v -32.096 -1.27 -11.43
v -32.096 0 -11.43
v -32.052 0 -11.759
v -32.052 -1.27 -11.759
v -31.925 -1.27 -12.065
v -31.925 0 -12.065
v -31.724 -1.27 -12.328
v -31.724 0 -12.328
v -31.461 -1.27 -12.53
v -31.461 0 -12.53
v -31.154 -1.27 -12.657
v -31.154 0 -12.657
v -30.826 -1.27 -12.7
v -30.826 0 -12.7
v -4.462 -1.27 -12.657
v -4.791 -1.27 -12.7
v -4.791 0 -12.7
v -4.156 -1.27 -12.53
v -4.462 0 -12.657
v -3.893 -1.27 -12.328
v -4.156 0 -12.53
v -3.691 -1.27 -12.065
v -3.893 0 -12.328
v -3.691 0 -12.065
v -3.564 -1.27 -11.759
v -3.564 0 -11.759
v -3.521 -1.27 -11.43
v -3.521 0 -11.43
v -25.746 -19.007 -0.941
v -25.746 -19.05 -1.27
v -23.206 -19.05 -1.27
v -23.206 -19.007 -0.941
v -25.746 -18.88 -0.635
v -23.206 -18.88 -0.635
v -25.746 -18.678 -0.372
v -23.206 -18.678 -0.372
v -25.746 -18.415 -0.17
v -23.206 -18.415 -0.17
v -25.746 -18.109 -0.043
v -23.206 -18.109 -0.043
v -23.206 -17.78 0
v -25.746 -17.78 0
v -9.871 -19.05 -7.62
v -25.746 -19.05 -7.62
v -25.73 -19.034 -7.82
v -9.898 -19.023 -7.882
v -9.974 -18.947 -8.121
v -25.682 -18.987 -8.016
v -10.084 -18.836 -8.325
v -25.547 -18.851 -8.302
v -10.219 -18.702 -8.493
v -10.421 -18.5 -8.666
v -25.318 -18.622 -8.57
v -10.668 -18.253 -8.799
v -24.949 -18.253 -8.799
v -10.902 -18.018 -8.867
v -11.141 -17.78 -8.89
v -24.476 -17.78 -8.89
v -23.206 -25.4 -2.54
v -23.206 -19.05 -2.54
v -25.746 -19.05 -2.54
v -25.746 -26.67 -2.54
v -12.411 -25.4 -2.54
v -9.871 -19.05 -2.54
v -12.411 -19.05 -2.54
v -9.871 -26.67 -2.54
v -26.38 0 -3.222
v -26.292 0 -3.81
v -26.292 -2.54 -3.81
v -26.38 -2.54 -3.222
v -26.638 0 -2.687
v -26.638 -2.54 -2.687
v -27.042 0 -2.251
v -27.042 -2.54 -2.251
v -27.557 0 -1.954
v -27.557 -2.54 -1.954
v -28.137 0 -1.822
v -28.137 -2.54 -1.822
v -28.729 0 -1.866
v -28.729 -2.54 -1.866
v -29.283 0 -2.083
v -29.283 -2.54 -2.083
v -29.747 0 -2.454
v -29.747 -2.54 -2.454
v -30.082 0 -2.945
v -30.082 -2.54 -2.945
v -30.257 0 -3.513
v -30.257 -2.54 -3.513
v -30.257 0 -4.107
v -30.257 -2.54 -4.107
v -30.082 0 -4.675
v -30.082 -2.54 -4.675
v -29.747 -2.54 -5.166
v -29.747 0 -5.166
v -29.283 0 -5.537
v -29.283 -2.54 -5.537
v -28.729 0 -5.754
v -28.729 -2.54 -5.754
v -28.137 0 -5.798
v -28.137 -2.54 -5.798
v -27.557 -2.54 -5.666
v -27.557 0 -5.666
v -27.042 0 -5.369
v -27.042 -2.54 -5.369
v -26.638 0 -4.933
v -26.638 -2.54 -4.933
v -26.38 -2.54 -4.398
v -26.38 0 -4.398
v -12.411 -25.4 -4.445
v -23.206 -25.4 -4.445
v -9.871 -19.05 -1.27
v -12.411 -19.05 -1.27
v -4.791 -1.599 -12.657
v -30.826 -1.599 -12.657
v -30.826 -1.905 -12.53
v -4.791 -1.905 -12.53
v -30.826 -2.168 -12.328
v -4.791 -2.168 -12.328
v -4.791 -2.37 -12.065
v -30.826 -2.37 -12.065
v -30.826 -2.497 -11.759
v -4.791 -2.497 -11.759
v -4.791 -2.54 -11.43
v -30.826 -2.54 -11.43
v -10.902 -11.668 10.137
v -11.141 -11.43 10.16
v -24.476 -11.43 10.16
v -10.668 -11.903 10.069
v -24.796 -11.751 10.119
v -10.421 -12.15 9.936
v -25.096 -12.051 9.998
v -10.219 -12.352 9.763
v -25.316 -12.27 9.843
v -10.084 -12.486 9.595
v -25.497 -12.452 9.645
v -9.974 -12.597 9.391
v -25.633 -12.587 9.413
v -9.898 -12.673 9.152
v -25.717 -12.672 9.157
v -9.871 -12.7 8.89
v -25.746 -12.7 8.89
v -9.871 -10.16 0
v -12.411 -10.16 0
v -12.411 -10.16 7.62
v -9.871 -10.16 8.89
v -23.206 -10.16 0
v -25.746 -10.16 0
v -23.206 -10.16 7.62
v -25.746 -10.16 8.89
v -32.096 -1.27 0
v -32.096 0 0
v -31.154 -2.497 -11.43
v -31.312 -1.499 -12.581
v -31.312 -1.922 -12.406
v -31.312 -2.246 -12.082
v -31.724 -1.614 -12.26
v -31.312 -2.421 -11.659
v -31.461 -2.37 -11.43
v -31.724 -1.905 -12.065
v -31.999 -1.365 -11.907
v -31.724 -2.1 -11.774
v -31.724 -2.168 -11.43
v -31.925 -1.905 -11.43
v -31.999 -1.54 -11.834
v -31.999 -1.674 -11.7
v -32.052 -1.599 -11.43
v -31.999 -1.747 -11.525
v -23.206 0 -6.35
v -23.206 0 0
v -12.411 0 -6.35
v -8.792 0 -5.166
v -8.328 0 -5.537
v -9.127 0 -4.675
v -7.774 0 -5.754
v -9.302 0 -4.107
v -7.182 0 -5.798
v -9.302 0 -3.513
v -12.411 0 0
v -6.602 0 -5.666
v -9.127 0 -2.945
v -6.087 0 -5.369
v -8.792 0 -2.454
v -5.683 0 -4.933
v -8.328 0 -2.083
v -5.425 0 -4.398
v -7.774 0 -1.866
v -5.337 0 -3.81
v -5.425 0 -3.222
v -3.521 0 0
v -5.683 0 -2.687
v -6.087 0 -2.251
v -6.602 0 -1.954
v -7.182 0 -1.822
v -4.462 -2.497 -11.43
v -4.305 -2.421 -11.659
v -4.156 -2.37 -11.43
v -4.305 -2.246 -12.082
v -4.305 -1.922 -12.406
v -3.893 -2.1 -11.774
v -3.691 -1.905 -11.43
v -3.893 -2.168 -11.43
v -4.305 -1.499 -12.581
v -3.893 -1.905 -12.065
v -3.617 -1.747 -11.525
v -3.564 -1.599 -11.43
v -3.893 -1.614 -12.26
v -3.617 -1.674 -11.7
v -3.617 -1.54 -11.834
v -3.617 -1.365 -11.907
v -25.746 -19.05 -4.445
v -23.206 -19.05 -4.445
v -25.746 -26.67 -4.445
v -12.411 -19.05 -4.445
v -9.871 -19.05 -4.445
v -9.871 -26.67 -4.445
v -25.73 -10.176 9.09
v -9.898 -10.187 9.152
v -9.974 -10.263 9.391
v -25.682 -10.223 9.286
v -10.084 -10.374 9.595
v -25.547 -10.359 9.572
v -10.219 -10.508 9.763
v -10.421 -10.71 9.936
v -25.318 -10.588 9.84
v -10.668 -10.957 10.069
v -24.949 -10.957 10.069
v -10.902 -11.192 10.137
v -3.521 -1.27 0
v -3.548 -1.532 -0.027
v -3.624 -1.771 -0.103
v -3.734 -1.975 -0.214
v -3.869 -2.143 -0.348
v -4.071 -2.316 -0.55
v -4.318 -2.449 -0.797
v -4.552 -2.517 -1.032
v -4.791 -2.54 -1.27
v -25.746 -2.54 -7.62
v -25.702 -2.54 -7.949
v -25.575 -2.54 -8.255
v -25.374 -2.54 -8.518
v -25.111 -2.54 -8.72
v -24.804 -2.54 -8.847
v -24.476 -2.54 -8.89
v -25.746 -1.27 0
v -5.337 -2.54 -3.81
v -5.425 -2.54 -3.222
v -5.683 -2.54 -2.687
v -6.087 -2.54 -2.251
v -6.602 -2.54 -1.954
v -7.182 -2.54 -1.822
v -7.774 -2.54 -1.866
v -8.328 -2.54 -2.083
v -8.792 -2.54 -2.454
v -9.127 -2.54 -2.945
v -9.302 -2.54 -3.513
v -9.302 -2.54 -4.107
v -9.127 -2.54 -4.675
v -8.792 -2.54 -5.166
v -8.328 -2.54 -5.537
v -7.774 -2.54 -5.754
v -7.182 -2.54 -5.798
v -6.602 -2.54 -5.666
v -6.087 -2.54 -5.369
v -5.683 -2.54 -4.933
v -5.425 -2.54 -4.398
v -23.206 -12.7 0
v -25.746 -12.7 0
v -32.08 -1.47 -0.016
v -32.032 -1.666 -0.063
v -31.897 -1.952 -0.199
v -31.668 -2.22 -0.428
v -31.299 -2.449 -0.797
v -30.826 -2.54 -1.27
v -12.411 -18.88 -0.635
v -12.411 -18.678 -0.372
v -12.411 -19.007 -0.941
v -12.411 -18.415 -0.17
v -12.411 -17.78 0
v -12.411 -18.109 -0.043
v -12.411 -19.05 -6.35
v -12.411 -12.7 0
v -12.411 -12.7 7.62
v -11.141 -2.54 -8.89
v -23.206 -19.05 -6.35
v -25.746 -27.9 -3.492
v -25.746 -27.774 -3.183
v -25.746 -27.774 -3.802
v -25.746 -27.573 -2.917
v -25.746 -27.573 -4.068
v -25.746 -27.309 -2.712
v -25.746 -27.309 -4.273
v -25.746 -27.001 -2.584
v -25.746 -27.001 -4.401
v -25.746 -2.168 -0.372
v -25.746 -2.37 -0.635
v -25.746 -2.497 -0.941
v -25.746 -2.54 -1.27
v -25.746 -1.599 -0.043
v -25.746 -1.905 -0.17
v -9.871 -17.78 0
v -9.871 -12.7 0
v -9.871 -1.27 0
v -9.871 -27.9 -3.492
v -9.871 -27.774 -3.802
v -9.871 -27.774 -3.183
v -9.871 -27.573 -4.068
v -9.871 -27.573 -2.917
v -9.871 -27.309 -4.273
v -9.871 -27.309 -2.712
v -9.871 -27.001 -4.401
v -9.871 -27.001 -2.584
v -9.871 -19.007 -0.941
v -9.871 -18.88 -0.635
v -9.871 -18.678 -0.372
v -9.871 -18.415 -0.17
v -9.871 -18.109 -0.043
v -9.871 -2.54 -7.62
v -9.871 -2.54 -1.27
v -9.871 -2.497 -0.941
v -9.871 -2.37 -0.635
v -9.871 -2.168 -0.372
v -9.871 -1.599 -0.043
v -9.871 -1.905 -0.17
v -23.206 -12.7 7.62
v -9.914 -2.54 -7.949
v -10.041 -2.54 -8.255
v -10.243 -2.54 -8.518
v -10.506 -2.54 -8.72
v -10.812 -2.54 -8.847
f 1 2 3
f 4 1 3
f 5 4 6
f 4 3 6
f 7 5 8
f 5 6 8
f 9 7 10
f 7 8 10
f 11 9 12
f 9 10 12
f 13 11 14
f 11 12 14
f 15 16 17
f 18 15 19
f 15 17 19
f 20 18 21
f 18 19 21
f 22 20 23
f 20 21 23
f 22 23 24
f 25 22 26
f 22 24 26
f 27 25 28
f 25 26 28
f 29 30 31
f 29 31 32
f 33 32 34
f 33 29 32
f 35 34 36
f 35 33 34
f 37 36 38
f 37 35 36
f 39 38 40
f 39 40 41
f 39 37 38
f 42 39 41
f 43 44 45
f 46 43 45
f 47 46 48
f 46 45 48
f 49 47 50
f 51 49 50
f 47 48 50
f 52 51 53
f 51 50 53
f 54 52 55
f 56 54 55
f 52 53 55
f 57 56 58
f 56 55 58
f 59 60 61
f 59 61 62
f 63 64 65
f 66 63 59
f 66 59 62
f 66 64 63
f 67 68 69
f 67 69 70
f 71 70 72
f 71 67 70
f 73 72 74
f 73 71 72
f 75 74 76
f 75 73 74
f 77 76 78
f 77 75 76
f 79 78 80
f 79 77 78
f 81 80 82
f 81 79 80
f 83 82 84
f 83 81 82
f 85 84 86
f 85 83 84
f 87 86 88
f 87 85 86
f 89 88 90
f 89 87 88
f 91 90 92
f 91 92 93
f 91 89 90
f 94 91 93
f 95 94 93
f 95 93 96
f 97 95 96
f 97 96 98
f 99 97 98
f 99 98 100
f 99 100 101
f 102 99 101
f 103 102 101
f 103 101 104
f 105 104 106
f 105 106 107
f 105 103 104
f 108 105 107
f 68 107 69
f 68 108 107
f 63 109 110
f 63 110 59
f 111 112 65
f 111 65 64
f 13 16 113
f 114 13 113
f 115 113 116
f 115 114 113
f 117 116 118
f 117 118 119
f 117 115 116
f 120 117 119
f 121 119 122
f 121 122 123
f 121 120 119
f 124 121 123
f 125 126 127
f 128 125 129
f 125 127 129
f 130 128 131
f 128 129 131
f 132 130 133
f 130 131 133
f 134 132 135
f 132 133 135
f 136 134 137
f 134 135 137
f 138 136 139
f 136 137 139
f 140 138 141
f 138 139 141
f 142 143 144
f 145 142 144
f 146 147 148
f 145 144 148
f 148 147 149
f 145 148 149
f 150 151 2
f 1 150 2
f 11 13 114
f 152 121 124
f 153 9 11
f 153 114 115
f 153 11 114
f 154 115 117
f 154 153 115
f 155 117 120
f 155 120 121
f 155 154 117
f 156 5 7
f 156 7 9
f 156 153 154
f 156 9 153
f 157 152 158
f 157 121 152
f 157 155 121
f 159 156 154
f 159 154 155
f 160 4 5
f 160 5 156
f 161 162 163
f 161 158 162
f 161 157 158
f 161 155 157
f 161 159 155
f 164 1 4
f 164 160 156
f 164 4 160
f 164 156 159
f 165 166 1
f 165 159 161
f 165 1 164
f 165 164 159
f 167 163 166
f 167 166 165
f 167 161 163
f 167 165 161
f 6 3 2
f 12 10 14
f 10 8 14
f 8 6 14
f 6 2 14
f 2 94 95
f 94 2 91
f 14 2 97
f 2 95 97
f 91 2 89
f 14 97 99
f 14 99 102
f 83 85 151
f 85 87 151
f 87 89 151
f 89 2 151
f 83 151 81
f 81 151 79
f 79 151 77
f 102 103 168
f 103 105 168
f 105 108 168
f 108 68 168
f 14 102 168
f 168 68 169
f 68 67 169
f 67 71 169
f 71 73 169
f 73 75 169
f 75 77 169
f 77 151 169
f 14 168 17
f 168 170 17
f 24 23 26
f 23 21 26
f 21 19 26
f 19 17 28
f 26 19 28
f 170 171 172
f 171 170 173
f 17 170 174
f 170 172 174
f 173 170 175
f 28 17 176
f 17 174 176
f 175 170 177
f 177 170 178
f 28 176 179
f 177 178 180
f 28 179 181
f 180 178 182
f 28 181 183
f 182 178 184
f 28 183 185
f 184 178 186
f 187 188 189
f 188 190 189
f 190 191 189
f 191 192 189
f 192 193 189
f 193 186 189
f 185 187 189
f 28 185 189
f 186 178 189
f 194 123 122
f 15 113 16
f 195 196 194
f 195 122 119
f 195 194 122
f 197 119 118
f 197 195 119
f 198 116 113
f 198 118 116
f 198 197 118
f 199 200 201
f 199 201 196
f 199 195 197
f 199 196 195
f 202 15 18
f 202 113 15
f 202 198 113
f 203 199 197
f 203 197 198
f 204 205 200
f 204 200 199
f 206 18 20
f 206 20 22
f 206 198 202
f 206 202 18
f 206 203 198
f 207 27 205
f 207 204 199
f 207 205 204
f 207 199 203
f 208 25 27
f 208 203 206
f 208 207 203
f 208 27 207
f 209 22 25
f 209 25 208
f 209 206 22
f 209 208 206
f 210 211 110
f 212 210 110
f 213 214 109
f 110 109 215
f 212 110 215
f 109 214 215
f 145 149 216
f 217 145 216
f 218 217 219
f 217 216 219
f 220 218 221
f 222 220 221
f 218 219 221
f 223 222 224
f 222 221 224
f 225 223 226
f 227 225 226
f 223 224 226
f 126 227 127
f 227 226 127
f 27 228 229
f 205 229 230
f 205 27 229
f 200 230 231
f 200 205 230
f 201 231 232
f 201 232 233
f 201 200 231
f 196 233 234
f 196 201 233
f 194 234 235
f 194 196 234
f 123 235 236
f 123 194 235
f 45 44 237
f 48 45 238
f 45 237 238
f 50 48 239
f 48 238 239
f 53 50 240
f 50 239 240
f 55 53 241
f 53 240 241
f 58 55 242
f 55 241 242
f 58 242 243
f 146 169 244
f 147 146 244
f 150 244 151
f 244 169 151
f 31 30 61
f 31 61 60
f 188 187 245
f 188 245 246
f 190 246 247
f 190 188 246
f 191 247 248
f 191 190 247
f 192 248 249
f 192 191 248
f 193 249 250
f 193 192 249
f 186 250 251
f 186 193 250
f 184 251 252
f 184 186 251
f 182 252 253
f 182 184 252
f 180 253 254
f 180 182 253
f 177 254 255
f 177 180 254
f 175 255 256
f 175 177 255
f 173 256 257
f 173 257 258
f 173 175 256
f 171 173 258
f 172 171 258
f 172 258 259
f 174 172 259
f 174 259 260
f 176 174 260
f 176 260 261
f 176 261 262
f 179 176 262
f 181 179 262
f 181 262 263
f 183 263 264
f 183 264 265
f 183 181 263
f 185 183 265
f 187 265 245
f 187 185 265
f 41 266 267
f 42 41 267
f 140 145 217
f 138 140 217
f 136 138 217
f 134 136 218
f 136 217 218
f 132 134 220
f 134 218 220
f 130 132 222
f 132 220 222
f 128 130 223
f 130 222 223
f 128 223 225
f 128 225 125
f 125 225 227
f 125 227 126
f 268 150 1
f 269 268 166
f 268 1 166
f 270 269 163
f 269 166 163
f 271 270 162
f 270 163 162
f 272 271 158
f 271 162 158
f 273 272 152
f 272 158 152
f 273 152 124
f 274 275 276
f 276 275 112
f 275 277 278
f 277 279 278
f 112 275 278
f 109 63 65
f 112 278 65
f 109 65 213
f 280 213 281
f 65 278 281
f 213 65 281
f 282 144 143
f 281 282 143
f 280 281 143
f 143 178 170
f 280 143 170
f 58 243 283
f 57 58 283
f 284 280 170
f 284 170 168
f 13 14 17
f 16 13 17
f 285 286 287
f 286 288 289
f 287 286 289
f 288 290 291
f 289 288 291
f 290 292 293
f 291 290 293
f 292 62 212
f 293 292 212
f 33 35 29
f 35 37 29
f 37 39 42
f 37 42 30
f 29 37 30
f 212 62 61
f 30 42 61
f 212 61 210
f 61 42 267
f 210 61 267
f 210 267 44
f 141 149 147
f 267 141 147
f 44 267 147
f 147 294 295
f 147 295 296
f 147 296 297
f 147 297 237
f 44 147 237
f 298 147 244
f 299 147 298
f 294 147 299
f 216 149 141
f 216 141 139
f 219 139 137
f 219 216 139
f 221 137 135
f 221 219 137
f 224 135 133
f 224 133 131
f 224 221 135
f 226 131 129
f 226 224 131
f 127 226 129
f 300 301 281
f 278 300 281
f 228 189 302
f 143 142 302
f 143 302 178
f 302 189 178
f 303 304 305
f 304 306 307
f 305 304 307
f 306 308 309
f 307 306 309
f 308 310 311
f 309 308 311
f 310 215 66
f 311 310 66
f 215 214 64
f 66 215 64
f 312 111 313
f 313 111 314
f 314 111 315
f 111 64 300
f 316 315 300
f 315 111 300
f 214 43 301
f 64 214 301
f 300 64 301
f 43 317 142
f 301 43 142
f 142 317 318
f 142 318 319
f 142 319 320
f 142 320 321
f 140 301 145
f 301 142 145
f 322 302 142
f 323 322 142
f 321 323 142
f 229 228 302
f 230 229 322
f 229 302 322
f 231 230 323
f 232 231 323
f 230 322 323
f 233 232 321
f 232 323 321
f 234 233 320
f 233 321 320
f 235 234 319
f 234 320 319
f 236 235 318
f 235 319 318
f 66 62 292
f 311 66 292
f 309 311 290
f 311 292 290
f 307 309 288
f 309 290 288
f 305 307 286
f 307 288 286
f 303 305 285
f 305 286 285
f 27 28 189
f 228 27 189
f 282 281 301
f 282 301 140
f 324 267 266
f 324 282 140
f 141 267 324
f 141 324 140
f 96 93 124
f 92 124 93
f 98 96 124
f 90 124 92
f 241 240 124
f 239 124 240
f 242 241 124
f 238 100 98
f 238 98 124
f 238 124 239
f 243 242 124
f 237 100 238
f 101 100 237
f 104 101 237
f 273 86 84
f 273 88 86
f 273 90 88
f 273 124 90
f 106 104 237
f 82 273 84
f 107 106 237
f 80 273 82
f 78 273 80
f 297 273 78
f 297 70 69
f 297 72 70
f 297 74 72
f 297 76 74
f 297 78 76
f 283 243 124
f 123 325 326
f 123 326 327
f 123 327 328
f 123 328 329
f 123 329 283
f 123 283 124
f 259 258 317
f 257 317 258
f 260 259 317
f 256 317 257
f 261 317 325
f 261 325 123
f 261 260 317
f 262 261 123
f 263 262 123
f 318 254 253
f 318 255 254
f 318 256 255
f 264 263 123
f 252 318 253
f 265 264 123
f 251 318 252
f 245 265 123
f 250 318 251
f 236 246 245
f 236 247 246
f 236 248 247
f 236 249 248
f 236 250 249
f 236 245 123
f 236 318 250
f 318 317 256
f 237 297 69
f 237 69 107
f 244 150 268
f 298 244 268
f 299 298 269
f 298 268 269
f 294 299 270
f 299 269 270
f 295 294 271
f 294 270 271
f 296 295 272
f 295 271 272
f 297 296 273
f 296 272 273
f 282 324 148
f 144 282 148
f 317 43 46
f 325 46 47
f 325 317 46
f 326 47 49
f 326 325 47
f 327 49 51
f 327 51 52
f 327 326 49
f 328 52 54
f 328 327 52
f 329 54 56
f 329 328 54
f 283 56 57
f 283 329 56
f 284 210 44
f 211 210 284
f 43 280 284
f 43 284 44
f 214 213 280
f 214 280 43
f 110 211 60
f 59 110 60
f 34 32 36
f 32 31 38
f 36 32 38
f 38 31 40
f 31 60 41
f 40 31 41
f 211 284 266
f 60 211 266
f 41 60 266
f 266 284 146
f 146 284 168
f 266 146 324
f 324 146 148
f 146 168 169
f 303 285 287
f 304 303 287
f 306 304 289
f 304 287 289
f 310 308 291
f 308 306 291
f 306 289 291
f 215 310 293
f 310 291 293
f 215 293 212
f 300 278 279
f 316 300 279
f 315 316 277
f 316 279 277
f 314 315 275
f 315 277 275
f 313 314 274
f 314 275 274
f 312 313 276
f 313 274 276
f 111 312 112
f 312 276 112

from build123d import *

# Parameters (mm, degrees)
F1_DEPTH      = 19.05
F0_R          = 1.9939
F2_DEPTH      = 2.54
F3_W          = 2.54
F3_H          = 1.905
F4_DEPTH      = 8.89
F5_W          = 2.54
F5_H          = 1.905
F6_DEPTH      = 11.43
F7_W          = 2.54
F7_H          = 2.54
F8_W          = 2.54
F8_H          = 2.54
F9_DEPTH      = 10.16
F10_W         = 2.54
F10_H         = 2.54
F11_DEPTH     = 11.43
F12_T1_DEPTH  = 9.525
F12_T3_DEPTH  = 14.605
F12_T5_DEPTH  = 26.035
F12_T7_DEPTH  = 9.525
F12_T9_DEPTH  = 4.445
F12_T11_DEPTH = 19.685
F12_T13_DEPTH = 22.225
F12_T15_DEPTH = 8.89
F12_T17_DEPTH = 8.89
F12_T19_DEPTH = 8.89
F12_S23_W     = 1.27
F12_S23_H     = 1.27
F12_T24_DEPTH = 1.27
F12_S29_W     = 1.27
F12_S29_H     = 1.27
F12_T30_DEPTH = 1.27


# Not quite as in the source:
# - a fillet or chamfer that OpenCascade refuses, or shapes differently, is made with other operations: its cross-section is extruded or revolved along the edge and cut away or added


with BuildPart() as f1:
    # F0 (on Front) → F1 (new body)
    with BuildSketch(Plane.XZ):
        Polygon((-23.2056408978, -6.35), (-23.2056408978, 0), (-25.7456408978, 0), (-25.7456408978, -8.89), (-9.8706408978, -8.89), (-9.8706408978, 0), (-12.4106408978, 0), (-12.4106408978, -6.35), align=None)
    extrude(amount=F1_DEPTH)

    # F0 (on Front) → F2 (join)
    with BuildSketch(Plane.XZ):
        Polygon((-25.7456408978, -8.89), (-25.7456408978, 0), (-32.0956408978, 0), (-32.0956408978, -12.7), (-3.5206408978, -12.7), (-3.5206408978, 0), (-9.8706408978, 0), (-9.8706408978, -8.89), align=None)
        with Locations((-28.2856408978, -3.81)):
            Circle(F0_R, mode=Mode.SUBTRACT)
        with Locations((-7.3306408978, -3.81)):
            Circle(F0_R, mode=Mode.SUBTRACT)
    extrude(amount=F2_DEPTH)

    # F3 (on face) → F4 (join)
    with BuildSketch(Plane.XZ.offset(19.05)):
        with Locations((-11.1406408978, -3.4925)):
            Rectangle(F3_W, F3_H)
        with Locations((-24.4756408978, -3.4925)):
            Rectangle(F3_W, F3_H)
    extrude(amount=F4_DEPTH)

    # F5 (on face) → F6 (join)
    with BuildSketch(Plane(origin=(-12.4106408978, 0, 0), x_dir=(0, -1, 0), z_dir=(-1, 0, 0))):
        with Locations((26.67, -3.4925)):
            Rectangle(F5_W, F5_H)
    extrude(amount=F6_DEPTH)

    # F7 (on face) + F8 (on face) → F9 (join)
    with BuildSketch(Plane.XY):
        with Locations((-24.4756408978, -11.43)):
            Rectangle(F7_W, F7_H)
    with BuildSketch(Plane.XY):
        with Locations((-11.1406408978, -11.43)):
            Rectangle(F8_W, F8_H)
    extrude(amount=F9_DEPTH)

    # F10 (on face) → F11 (join)
    with BuildSketch(Plane.YZ.offset(-23.2056408978)):
        with Locations((-11.43, 8.89)):
            Rectangle(F10_W, F10_H)
    extrude(amount=F11_DEPTH)

    # F12: fillet of radius 1.27 on 18 edges, made by hand

    # F12_s2 → F12_t1 (cut)
    with BuildSketch(Plane.YZ.offset(-35.2706408978)):
        with BuildLine():
            ThreePointArc((-1.27, 0), (-2.1680256121, -0.3719743879), (-2.54, -1.27))
            Line((-2.54, -1.27), (-2.54, 0))
            Line((-2.54, 0), (-1.27, 0))
        make_face()
    extrude(amount=F12_T1_DEPTH, mode=Mode.SUBTRACT)

    # F12_s4 → F12_t3 (cut)
    with BuildSketch(Plane.XY.offset(-11.43)):
        with BuildLine():
            ThreePointArc((-32.0956408978, -1.27), (-31.7236665099, -2.1680256121), (-30.8256408978, -2.54))
            Line((-30.8256408978, -2.54), (-32.0956408978, -2.54))
            Line((-32.0956408978, -2.54), (-32.0956408978, -1.27))
        make_face()
        with BuildLine():
            ThreePointArc((-3.5206408978, -1.27), (-3.8926152856, -2.1680256121), (-4.7906408978, -2.54))
            Line((-4.7906408978, -2.54), (-3.5206408978, -2.54))
            Line((-3.5206408978, -2.54), (-3.5206408978, -1.27))
        make_face()
    extrude(amount=F12_T3_DEPTH, mode=Mode.SUBTRACT)

    # F12_s6 → F12_t5 (cut)
    with BuildSketch(Plane.YZ.offset(-30.8256408978)):
        with BuildLine():
            ThreePointArc((-1.27, -12.7), (-2.1680256121, -12.3280256121), (-2.54, -11.43))
            Line((-2.54, -11.43), (-2.54, -12.7))
            Line((-2.54, -12.7), (-1.27, -12.7))
        make_face()
    extrude(amount=F12_T5_DEPTH, mode=Mode.SUBTRACT)

    # F12_s8 → F12_t7 (cut)
    with BuildSketch(Plane.YZ.offset(-9.8706408978)):
        with BuildLine():
            ThreePointArc((-1.27, 0), (-2.1680256121, -0.3719743879), (-2.54, -1.27))
            Line((-2.54, -1.27), (-2.54, 0))
            Line((-2.54, 0), (-1.27, 0))
        make_face()
    extrude(amount=F12_T7_DEPTH, mode=Mode.SUBTRACT)

    # F12_s10 → F12_t9 (cut)
    with BuildSketch(Plane.XZ.offset(-3.175)):
        with BuildLine():
            ThreePointArc((-4.7906408978, -12.7), (-3.8926152856, -12.3280256121), (-3.5206408978, -11.43))
            Line((-3.5206408978, -11.43), (-3.5206408978, -12.7))
            Line((-3.5206408978, -12.7), (-4.7906408978, -12.7))
        make_face()
        with BuildLine():
            ThreePointArc((-32.0956408978, -11.43), (-31.7236665099, -12.3280256121), (-30.8256408978, -12.7))
            Line((-30.8256408978, -12.7), (-32.0956408978, -12.7))
            Line((-32.0956408978, -12.7), (-32.0956408978, -11.43))
        make_face()
    extrude(amount=F12_T9_DEPTH, mode=Mode.SUBTRACT)

    # F12_s12 → F12_t11 (cut)
    with BuildSketch(Plane.XZ.offset(2.54)):
        with BuildLine():
            ThreePointArc((-9.8706408978, -7.62), (-10.2426152856, -8.5180256121), (-11.1406408978, -8.89))
            Line((-11.1406408978, -8.89), (-9.8706408978, -8.89))
            Line((-9.8706408978, -8.89), (-9.8706408978, -7.62))
        make_face()
        with BuildLine():
            ThreePointArc((-25.7456408978, -7.62), (-25.3736665099, -8.5180256121), (-24.4756408978, -8.89))
            Line((-24.4756408978, -8.89), (-25.7456408978, -8.89))
            Line((-25.7456408978, -8.89), (-25.7456408978, -7.62))
        make_face()
    extrude(amount=F12_T11_DEPTH, mode=Mode.SUBTRACT)

    # F12_s14 → F12_t13 (cut)
    with BuildSketch(Plane.YZ.offset(-28.9206408978)):
        with BuildLine():
            ThreePointArc((-26.67, -2.54), (-27.5680256121, -2.9119743879), (-27.94, -3.81))
            Line((-27.94, -3.81), (-27.94, -2.54))
            Line((-27.94, -2.54), (-26.67, -2.54))
        make_face()
        with BuildLine():
            ThreePointArc((-19.05, -7.62), (-18.6780256121, -8.5180256121), (-17.78, -8.89))
            Line((-17.78, -8.89), (-19.05, -8.89))
            Line((-19.05, -8.89), (-19.05, -7.62))
        make_face()
        with BuildLine():
            ThreePointArc((-27.94, -3.175), (-27.5680256121, -4.0730256121), (-26.67, -4.445))
            Line((-26.67, -4.445), (-27.94, -4.445))
            Line((-27.94, -4.445), (-27.94, -3.175))
        make_face()
        with BuildLine():
            ThreePointArc((-11.43, 10.16), (-12.3280256121, 9.7880256121), (-12.7, 8.89))
            Line((-12.7, 8.89), (-12.7, 10.16))
            Line((-12.7, 10.16), (-11.43, 10.16))
        make_face()
        with BuildLine():
            ThreePointArc((-10.16, 8.89), (-10.5319743879, 9.7880256121), (-11.43, 10.16))
            Line((-11.43, 10.16), (-10.16, 10.16))
            Line((-10.16, 10.16), (-10.16, 8.89))
        make_face()
    extrude(amount=F12_T13_DEPTH, mode=Mode.SUBTRACT)

    # F12_s16 → F12_t15 (cut)
    with BuildSketch(Plane.YZ.offset(-28.9206408978)):
        with BuildLine():
            ThreePointArc((-19.05, -1.27), (-18.6780256121, -0.3719743879), (-17.78, 0))
            Line((-17.78, 0), (-19.05, 0))
            Line((-19.05, 0), (-19.05, -1.27))
        make_face()
    extrude(amount=F12_T15_DEPTH, mode=Mode.SUBTRACT)

    # F12_s18 → F12_t17 (cut)
    with BuildSketch(Plane.YZ.offset(-15.5856408978)):
        with BuildLine():
            ThreePointArc((-17.78, 0), (-18.6780256121, -0.3719743879), (-19.05, -1.27))
            Line((-19.05, -1.27), (-19.05, 0))
            Line((-19.05, 0), (-17.78, 0))
        make_face()
    extrude(amount=F12_T17_DEPTH, mode=Mode.SUBTRACT)

    # F12_s20 → F12_t19 (cut)
    with BuildSketch(Plane.XZ.offset(6.985)):
        with BuildLine():
            ThreePointArc((-25.7456408978, 8.89), (-25.3736665099, 9.7880256121), (-24.4756408978, 10.16))
            Line((-24.4756408978, 10.16), (-25.7456408978, 10.16))
            Line((-25.7456408978, 10.16), (-25.7456408978, 8.89))
        make_face()
        with BuildLine():
            ThreePointArc((-9.8706408978, 8.89), (-10.2426152856, 9.7880256121), (-11.1406408978, 10.16))
            Line((-11.1406408978, 10.16), (-9.8706408978, 10.16))
            Line((-9.8706408978, 10.16), (-9.8706408978, 8.89))
        make_face()
    extrude(amount=F12_T19_DEPTH, mode=Mode.SUBTRACT)


with BuildPart() as f12_tool22:
    # F12_s23 → F12_t24 (new body)
    with BuildSketch(Plane.YZ.offset(-30.8256408978)):
        with Locations((-1.905, -12.065)):
            Rectangle(F12_S23_W, F12_S23_H)
    extrude(amount=-F12_T24_DEPTH)

    # F12_s25 → F12_t26 (revolve, cut)
    with BuildSketch(Plane(origin=(-30.8256408978, -1.27, -11.43), x_dir=(0, 0.7071067812, 0.7071067812), z_dir=(0, -0.7071067812, 0.7071067812))):
        with BuildLine():
            ThreePointArc((0, -1.27), (1.27, 0), (0, 1.27))
            Line((0, 1.27), (0, -1.27))
        make_face()
    revolve(axis=Axis((-30.8256408978, -1.27, -11.43), (-1, 0, 0)), mode=Mode.SUBTRACT)


with BuildPart() as f1_1:
    add(f1.part)

    # F12_t21: cut F12_tool22
    add(f12_tool22.part, mode=Mode.SUBTRACT)


with BuildPart() as f12_tool28:
    # F12_s29 → F12_t30 (new body)
    with BuildSketch(Plane.YZ.offset(-4.7906408978)):
        with Locations((-1.905, -12.065)):
            Rectangle(F12_S29_W, F12_S29_H)
    extrude(amount=F12_T30_DEPTH)

    # F12_s31 → F12_t32 (revolve, cut)
    with BuildSketch(Plane(origin=(-4.7906408978, -1.27, -11.43), x_dir=(0, 0.7071067812, 0.7071067812), z_dir=(0, 0.7071067812, -0.7071067812))):
        with BuildLine():
            ThreePointArc((0, -1.27), (1.27, 0), (0, 1.27))
            Line((0, 1.27), (0, -1.27))
        make_face()
    revolve(axis=Axis((-4.7906408978, -1.27, -11.43), (1, 0, 0)), mode=Mode.SUBTRACT)


with BuildPart() as f1_2:
    add(f1_1.part)

    # F12_t27: cut F12_tool28
    add(f12_tool28.part, mode=Mode.SUBTRACT)


solid = f1_2.part
